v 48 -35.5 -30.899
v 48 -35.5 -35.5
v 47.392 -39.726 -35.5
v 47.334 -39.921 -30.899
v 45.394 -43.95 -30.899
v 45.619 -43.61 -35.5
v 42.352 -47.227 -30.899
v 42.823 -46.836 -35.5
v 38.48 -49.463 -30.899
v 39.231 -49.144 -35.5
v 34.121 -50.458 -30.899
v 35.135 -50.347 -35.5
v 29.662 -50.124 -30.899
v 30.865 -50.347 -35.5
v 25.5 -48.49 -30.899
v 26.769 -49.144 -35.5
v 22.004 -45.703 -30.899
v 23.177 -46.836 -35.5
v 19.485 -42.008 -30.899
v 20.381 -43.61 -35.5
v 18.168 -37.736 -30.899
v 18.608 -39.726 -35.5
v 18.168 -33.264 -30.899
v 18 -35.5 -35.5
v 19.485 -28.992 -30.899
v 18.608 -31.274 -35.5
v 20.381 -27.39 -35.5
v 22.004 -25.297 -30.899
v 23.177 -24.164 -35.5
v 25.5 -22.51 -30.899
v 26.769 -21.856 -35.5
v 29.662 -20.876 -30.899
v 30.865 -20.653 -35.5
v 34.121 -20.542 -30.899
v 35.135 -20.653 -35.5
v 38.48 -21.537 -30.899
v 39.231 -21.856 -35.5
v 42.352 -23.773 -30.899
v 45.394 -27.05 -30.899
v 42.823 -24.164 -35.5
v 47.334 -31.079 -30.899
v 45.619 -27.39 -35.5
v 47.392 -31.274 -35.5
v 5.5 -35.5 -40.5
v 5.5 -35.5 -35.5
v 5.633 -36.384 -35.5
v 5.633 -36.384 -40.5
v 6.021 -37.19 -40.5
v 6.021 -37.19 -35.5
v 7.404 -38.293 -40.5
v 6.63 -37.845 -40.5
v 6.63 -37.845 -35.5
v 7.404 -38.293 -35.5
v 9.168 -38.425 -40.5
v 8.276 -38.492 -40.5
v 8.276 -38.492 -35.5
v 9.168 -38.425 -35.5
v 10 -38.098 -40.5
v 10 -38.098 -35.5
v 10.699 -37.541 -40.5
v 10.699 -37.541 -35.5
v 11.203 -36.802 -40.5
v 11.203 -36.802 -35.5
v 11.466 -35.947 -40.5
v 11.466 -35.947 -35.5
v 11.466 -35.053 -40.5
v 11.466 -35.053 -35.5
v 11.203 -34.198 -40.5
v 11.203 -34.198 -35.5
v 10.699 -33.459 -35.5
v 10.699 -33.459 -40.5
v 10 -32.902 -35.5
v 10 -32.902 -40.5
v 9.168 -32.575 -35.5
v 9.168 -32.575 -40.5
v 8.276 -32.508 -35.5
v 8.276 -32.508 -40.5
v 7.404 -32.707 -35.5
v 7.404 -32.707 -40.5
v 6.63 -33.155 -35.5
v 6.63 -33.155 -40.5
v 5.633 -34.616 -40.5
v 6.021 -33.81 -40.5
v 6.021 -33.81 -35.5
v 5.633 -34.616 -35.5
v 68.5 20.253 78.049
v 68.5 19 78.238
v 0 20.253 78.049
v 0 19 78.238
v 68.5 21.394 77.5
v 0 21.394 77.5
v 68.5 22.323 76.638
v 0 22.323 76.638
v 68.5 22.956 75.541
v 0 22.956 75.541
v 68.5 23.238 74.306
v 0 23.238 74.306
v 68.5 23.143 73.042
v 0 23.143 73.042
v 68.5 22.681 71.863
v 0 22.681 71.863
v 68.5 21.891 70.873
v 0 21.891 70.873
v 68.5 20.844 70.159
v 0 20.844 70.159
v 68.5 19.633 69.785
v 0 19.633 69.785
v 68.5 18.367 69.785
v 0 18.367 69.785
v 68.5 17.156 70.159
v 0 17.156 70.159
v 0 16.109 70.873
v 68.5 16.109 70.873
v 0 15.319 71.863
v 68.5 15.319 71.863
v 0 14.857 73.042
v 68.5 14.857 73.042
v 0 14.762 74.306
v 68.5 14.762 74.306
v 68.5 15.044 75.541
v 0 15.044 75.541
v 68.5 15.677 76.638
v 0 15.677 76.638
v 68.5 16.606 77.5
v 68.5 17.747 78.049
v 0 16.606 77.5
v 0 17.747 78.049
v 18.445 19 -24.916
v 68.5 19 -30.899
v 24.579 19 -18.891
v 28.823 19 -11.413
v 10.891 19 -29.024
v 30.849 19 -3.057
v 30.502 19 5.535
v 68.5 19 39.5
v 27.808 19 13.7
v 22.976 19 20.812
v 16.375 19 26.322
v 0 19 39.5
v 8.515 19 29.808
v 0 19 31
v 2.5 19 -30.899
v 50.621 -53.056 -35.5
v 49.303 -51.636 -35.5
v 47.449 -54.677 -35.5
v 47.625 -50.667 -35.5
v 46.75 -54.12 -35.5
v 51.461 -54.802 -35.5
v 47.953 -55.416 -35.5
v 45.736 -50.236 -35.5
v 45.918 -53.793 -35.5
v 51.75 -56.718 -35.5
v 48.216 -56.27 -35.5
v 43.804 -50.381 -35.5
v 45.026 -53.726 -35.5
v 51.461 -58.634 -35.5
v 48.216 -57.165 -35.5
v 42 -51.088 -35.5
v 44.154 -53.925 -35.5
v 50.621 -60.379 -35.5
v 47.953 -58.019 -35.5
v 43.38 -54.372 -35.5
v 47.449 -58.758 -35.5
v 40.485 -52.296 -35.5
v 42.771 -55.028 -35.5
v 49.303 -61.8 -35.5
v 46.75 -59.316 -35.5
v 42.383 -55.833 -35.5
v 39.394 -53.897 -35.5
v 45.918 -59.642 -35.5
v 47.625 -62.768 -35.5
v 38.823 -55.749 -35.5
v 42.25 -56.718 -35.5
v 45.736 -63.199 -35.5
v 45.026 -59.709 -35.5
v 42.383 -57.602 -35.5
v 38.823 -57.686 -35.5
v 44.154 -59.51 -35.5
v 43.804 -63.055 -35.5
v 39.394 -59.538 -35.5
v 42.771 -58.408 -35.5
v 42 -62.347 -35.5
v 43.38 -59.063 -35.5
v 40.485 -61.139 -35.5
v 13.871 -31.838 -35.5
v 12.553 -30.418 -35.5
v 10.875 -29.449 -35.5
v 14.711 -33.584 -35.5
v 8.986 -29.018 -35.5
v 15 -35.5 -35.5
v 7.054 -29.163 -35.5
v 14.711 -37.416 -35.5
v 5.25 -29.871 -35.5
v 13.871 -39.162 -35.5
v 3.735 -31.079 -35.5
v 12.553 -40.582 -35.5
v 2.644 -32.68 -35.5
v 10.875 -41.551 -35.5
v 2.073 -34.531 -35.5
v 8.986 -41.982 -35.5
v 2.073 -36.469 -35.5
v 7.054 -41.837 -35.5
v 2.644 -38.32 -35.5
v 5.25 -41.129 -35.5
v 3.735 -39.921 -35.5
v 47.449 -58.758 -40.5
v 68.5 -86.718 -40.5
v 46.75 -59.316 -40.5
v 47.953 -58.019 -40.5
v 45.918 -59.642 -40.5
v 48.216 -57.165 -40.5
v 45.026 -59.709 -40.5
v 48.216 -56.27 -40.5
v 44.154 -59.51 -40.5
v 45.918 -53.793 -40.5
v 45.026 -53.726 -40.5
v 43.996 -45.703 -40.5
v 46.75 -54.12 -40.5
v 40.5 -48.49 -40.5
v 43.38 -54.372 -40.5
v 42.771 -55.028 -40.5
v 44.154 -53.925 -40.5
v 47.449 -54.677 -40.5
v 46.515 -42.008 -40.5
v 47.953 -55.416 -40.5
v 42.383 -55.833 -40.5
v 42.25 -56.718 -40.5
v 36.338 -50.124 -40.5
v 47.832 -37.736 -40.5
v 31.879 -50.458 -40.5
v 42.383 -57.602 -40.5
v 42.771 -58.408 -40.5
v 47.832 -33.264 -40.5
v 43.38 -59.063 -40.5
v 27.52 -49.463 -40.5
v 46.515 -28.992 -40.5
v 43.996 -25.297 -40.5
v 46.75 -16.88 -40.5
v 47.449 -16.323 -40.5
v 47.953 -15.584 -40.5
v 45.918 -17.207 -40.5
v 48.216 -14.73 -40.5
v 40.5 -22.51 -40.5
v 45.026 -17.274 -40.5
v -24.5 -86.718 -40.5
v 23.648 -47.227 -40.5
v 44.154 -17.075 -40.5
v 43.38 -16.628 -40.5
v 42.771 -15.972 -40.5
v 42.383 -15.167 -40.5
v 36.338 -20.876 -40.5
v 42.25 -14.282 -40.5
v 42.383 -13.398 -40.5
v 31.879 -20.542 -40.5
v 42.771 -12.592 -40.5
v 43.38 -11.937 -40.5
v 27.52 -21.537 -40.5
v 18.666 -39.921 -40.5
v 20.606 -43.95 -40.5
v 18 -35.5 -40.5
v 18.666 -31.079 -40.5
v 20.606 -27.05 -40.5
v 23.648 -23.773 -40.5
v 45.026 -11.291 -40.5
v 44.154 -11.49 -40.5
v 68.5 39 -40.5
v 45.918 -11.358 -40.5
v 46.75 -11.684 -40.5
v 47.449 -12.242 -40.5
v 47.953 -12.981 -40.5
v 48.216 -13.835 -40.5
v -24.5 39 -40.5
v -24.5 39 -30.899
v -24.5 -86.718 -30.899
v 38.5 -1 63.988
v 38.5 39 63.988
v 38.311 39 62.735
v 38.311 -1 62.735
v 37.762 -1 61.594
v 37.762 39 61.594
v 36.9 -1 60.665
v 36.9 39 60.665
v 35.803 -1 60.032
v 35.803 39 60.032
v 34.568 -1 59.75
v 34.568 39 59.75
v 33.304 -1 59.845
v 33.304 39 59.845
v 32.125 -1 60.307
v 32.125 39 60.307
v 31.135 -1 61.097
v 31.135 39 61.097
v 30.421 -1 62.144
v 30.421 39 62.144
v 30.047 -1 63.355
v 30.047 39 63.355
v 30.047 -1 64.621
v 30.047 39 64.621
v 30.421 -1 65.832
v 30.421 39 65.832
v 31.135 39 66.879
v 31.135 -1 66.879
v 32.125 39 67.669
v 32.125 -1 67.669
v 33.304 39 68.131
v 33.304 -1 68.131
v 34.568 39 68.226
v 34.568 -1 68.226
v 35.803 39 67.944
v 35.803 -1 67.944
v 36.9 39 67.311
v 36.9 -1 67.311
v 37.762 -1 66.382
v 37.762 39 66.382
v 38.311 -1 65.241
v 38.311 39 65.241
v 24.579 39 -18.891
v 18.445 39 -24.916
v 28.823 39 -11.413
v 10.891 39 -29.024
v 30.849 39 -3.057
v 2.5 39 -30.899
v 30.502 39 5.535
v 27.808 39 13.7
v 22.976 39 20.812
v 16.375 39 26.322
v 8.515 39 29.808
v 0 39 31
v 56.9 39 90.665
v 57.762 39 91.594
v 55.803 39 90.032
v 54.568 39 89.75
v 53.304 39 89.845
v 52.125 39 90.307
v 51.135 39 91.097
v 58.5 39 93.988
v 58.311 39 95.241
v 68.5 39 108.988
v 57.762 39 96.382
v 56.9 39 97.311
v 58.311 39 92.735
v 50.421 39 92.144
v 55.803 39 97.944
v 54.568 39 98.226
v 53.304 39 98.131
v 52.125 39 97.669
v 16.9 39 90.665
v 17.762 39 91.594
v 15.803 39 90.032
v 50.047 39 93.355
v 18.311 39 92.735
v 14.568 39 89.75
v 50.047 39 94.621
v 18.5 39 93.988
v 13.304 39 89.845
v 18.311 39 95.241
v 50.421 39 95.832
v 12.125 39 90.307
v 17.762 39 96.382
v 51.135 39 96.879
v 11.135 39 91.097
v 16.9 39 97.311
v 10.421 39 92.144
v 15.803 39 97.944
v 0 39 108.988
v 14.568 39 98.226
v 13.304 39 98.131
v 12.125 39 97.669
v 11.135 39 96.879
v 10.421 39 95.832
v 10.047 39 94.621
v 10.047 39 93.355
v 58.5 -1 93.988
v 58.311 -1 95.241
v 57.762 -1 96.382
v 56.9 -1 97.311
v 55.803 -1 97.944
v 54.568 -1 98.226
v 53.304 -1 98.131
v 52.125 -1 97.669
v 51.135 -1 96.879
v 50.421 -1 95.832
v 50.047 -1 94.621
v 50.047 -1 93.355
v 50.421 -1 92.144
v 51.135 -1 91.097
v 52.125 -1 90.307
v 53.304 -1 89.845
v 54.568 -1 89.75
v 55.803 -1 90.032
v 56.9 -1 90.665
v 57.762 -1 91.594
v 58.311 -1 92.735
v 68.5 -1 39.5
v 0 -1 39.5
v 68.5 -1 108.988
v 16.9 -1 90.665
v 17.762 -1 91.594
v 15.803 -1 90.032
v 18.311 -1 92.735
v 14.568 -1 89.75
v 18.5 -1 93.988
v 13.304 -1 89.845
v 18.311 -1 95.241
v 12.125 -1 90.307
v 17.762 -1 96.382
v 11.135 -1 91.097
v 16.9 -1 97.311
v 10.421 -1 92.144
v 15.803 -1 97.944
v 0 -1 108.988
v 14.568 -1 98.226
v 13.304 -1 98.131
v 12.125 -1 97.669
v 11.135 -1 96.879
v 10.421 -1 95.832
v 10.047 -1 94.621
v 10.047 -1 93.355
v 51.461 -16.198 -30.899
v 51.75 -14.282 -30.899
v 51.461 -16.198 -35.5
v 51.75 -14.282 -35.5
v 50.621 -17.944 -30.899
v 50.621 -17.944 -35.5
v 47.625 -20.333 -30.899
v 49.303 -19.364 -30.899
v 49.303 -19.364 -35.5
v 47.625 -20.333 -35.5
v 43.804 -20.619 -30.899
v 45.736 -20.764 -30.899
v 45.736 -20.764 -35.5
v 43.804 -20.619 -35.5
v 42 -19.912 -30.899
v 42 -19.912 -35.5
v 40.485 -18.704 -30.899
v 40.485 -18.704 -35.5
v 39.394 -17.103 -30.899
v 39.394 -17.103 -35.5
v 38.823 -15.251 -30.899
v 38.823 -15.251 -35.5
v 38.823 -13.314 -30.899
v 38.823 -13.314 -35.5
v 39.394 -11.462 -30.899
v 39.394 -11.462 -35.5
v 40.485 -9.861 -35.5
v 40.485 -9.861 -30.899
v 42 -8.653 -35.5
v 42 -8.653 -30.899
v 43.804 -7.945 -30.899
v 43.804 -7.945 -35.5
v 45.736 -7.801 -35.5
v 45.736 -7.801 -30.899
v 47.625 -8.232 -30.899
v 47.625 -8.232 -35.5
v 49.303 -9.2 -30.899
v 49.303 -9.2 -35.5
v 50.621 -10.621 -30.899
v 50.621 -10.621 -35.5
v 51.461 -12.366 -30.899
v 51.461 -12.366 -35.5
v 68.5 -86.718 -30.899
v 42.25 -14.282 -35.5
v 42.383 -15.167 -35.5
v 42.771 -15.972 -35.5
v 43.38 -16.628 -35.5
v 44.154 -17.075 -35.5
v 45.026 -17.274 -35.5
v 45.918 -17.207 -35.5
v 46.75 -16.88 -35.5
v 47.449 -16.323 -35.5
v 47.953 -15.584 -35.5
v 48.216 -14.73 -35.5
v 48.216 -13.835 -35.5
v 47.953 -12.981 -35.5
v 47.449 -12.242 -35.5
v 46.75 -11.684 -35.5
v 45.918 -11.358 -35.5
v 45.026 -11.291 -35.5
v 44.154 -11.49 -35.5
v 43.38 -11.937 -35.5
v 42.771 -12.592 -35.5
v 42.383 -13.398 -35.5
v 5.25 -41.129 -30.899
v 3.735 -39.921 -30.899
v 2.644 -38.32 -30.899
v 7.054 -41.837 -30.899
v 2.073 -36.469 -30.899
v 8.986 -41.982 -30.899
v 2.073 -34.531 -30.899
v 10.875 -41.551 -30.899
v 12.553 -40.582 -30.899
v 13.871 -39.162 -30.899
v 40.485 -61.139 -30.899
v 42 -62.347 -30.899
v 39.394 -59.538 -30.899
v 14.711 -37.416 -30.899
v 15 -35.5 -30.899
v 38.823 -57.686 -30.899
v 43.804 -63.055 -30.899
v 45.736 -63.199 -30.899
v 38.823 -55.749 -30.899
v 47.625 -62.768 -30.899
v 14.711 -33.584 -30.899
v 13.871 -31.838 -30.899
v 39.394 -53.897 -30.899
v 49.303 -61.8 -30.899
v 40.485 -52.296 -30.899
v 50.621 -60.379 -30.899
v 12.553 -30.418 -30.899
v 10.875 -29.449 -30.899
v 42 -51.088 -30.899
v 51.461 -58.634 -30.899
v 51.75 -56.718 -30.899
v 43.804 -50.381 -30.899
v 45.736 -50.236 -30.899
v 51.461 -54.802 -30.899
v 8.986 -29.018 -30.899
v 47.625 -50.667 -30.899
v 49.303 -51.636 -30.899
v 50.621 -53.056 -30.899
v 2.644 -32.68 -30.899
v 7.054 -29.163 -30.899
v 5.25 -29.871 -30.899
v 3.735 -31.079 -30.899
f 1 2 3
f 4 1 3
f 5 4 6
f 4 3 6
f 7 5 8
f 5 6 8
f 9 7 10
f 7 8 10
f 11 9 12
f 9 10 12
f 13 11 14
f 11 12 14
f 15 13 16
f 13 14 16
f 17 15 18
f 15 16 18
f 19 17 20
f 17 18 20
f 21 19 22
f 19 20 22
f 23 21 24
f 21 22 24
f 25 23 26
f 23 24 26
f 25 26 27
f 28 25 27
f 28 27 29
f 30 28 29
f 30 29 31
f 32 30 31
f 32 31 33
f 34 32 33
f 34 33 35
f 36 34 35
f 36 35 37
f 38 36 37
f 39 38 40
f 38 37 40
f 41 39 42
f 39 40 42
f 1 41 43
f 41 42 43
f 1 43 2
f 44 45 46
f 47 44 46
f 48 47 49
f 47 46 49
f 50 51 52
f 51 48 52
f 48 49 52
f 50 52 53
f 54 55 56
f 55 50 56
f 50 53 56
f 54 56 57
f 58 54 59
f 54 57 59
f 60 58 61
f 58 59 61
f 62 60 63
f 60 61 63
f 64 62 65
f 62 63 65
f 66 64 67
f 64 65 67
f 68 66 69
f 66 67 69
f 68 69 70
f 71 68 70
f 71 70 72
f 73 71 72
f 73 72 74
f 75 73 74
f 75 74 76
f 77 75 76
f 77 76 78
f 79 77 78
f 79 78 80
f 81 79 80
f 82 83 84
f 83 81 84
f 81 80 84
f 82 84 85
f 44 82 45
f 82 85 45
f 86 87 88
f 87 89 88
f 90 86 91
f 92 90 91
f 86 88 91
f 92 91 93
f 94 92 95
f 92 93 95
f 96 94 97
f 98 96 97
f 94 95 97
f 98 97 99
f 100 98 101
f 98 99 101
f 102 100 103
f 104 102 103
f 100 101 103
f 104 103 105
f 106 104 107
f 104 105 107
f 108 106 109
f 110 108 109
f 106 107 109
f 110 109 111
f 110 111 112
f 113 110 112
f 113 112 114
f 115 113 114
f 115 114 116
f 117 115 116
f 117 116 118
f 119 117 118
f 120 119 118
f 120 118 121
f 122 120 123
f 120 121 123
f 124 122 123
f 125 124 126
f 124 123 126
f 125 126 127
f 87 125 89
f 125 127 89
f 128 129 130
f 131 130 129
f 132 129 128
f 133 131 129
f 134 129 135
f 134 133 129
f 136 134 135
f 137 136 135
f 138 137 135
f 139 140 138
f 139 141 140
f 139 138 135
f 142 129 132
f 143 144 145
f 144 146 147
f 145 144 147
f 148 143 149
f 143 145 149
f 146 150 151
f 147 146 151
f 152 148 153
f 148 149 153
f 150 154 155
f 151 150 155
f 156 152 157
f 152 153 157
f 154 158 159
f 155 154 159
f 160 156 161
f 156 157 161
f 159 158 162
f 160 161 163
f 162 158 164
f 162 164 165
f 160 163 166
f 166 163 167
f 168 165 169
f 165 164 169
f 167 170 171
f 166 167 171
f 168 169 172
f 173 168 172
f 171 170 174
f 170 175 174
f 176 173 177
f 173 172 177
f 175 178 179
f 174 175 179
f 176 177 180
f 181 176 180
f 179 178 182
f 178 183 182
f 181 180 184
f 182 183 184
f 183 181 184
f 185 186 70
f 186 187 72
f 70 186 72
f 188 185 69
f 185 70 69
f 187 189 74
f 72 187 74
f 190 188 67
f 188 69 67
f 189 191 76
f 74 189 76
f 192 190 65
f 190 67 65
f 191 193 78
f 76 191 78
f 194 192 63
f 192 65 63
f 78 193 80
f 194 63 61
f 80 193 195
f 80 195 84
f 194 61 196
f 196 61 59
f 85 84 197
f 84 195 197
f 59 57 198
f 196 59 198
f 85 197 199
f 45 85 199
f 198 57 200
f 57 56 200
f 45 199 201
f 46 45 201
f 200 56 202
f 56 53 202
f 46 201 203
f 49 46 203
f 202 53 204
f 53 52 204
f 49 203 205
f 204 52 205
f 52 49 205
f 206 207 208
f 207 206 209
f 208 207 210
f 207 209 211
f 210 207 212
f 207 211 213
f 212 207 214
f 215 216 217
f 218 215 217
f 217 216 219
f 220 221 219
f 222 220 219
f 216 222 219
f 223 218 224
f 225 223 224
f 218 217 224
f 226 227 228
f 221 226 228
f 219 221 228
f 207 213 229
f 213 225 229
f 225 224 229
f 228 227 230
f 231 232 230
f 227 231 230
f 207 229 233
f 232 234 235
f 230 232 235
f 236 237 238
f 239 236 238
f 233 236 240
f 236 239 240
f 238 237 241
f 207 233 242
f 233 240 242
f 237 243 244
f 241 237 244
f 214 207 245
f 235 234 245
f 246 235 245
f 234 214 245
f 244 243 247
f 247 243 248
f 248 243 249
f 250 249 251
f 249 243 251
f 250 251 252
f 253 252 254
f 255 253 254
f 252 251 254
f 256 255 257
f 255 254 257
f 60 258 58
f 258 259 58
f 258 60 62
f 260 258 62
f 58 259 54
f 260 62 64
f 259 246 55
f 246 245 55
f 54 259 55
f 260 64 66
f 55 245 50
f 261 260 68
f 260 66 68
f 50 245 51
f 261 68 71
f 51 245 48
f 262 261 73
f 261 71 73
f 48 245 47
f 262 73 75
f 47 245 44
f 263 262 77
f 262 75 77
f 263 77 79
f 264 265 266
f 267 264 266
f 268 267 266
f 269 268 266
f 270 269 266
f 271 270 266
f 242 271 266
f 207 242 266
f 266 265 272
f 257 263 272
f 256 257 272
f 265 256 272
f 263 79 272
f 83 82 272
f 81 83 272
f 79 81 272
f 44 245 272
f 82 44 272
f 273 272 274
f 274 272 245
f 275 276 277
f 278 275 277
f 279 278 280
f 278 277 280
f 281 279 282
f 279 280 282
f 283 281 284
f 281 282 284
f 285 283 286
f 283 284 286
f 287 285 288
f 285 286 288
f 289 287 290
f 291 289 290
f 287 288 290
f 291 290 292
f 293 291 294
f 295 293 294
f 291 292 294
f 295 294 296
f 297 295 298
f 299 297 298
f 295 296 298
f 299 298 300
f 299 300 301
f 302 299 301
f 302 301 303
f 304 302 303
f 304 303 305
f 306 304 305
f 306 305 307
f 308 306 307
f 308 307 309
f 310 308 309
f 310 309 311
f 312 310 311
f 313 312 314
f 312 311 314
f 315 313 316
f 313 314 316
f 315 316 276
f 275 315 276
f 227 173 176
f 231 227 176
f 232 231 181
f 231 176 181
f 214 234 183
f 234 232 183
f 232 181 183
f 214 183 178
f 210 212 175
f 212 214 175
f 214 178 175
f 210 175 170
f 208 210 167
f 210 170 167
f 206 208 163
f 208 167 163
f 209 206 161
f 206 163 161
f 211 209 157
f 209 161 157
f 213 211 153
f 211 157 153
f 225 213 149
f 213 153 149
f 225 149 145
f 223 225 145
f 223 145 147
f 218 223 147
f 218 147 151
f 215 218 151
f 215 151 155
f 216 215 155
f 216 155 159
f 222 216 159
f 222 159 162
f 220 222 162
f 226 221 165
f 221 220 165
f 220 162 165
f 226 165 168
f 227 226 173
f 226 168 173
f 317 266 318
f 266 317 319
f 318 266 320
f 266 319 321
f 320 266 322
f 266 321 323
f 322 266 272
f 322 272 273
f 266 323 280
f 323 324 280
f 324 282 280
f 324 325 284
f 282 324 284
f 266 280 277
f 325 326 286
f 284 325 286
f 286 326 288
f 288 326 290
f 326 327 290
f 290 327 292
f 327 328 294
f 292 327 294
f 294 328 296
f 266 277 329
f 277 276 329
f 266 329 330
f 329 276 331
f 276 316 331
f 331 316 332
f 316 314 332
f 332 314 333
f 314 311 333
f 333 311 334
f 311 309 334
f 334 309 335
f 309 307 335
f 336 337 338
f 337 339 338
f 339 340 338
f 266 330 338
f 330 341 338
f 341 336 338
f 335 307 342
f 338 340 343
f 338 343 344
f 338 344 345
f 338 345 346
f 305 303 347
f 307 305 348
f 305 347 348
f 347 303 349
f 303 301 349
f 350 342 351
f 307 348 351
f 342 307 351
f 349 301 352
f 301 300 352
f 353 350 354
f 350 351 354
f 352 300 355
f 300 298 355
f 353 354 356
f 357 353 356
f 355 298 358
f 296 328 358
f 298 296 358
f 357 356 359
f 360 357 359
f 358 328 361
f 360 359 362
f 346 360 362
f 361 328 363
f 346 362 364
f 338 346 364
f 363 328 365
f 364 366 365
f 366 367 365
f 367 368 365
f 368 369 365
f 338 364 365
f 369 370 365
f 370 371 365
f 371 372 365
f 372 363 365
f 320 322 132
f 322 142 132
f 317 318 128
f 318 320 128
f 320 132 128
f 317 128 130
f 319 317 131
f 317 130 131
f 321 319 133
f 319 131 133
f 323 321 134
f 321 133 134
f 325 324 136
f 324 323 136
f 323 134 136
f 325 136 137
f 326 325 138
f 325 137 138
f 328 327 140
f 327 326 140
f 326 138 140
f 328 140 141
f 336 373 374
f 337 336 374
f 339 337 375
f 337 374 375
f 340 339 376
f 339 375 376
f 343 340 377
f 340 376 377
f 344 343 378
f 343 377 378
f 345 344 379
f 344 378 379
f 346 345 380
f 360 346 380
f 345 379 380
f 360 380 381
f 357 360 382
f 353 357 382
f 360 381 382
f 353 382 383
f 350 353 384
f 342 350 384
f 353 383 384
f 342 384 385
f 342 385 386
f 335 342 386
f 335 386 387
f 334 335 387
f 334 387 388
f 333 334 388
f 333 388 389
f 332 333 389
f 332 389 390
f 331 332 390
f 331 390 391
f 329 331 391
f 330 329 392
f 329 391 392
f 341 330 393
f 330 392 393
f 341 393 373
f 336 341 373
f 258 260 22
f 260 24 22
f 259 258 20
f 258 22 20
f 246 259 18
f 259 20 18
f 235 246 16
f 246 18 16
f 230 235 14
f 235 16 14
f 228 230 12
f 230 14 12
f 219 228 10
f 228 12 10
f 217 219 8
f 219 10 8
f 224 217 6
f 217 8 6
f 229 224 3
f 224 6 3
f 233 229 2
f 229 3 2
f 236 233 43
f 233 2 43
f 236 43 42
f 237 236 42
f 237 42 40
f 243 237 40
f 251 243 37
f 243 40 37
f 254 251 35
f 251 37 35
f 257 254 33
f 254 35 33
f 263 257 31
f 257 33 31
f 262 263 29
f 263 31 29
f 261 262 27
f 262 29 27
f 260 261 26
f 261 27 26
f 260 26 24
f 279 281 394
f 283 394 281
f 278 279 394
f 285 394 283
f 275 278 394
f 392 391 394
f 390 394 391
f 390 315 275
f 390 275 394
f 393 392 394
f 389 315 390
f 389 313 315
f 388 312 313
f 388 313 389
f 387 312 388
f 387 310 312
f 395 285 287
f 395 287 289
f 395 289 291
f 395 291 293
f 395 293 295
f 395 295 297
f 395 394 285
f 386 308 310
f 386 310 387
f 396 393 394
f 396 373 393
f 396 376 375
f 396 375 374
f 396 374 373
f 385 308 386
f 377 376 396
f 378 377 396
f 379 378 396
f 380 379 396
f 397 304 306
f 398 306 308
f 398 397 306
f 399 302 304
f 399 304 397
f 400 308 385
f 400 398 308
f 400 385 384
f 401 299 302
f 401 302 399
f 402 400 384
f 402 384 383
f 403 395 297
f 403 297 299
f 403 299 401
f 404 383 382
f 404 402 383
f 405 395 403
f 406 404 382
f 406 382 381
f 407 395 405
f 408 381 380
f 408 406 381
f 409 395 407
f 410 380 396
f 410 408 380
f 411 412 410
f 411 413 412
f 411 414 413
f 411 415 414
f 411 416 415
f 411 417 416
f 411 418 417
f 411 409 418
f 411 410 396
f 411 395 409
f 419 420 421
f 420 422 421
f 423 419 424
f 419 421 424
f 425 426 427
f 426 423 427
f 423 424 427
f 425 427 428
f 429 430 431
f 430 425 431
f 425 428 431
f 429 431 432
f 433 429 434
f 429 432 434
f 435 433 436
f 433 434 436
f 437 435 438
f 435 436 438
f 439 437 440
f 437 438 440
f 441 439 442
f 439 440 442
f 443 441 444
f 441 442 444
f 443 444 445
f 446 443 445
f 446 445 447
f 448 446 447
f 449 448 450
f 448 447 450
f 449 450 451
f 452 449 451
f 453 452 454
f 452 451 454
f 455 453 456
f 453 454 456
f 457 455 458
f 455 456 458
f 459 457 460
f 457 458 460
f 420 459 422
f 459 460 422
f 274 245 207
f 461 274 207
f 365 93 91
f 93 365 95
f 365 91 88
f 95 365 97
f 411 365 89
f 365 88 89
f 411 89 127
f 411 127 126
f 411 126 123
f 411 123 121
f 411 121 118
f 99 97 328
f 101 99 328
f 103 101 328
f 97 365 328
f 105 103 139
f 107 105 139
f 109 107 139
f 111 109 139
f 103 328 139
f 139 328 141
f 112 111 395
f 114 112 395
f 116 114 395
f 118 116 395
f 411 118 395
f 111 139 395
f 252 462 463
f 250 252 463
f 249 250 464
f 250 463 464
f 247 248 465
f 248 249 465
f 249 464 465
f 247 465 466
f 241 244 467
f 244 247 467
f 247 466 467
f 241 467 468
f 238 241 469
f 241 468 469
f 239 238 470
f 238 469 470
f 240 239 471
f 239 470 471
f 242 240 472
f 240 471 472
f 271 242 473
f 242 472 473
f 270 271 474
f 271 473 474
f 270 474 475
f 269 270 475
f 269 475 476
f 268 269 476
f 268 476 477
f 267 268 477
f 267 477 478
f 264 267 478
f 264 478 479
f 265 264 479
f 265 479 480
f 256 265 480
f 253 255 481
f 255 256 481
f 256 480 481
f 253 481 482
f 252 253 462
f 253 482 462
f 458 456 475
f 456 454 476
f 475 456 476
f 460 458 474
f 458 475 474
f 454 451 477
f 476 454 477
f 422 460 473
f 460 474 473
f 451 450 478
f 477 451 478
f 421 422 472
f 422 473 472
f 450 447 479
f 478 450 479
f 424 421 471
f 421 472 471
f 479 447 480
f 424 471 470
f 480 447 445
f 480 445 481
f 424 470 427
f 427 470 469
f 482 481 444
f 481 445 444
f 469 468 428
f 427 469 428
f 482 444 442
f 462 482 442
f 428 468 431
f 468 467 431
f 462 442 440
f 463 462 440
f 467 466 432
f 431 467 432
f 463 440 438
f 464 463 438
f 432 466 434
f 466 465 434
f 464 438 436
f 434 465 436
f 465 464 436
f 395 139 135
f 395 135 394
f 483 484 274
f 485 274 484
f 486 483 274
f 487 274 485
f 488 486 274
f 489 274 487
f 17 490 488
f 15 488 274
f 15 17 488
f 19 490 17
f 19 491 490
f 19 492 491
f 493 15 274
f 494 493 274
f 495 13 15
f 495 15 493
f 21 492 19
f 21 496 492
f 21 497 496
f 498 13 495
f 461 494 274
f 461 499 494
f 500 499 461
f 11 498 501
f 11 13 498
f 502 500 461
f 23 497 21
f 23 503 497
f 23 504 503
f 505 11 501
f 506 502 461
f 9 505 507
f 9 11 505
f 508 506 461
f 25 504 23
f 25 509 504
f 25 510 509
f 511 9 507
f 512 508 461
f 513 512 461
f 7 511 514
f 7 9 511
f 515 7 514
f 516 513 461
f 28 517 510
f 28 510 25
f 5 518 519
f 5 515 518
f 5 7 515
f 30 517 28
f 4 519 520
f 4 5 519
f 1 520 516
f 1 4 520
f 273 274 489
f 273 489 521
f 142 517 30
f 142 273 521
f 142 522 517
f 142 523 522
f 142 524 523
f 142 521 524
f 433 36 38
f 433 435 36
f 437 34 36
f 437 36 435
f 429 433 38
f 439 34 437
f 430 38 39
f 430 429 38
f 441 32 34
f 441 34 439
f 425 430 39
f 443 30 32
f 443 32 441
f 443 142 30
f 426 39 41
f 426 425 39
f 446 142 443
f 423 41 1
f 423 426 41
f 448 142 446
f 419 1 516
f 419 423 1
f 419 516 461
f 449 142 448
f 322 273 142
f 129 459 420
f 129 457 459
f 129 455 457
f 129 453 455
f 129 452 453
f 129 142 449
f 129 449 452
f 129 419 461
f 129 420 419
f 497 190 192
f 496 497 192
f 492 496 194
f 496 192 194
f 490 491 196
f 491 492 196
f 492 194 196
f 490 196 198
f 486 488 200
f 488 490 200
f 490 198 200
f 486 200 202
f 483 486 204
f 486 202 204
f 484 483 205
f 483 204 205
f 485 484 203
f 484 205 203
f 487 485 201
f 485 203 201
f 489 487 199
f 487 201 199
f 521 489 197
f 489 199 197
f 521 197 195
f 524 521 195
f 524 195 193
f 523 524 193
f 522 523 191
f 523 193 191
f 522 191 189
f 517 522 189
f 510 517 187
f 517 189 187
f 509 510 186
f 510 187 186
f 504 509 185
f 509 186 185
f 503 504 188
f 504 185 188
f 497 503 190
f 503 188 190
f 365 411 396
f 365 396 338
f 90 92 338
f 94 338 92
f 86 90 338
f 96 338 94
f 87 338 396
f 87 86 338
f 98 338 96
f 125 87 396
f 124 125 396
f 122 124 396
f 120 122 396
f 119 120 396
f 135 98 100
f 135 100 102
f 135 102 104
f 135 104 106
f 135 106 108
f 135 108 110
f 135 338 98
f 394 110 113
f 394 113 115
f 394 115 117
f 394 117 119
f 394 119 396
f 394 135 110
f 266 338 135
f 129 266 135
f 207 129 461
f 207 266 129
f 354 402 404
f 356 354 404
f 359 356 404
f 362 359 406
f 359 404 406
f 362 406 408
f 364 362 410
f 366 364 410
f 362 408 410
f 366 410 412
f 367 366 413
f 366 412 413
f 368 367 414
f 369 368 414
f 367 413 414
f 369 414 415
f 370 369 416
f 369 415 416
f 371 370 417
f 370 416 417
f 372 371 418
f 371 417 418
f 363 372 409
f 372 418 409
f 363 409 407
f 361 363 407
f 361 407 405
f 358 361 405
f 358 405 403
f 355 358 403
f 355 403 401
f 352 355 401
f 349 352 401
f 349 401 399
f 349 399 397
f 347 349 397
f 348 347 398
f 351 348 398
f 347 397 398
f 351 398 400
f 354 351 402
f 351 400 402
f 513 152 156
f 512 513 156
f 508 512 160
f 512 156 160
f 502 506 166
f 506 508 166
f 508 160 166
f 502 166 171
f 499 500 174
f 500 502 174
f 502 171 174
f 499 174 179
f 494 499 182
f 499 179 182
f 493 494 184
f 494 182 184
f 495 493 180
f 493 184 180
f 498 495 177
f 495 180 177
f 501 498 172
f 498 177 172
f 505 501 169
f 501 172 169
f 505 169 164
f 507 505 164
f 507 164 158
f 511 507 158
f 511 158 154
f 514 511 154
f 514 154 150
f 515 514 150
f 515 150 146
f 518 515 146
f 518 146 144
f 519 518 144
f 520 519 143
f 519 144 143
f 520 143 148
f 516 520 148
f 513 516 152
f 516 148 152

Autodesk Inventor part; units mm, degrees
ref_plane "YZ Plane" through (0, 0, 0) normal (1, 0, 0) x (0, 1, 0)
ref_plane "XZ Plane" through (0, 0, 0) normal (0, 1, 0) x (-1, 0, 0)
ref_plane "Work Plane1" through (8.5, -35.5, -35.5) normal (0, 0, -1) x (-1, 0, 0)
sketch "Sketch1" plane through (8.5, -35.5, -35.5) normal (0, 0, -1) x (-1, 0, 0)
  circle A0 centre (0, 0) radius 3 projected
  circle A1 centre (0, 0) radius 6 projected
  circle A2 centre (-36.75, -21.2176) radius 3 projected
  circle A3 centre (-36.75, -21.2176) radius 6 projected
  circle A4 centre (-36.75, 21.2176) radius 6 projected
  circle A5 centre (-36.75, 21.2176) radius 3 projected
  line L0 (-36.75, -46.2176) -> (28, -46.2176)
  line L1 (28, -46.2176) -> (28, 0)
  line L2 (-36.75, -46.2176) -> (-59, -46.2176)
  line L3 (-59, -46.2176) -> (-59, 34.5)
  line L4 (-59, 34.5) -> (28, 34.5)
  line L5 (34.5, 35.5) -> (-17.5, 35.5) projected
  line L6 (28, 34.5) -> (28, 0)
  circle A6 centre (-24.5, 0) radius 11 projected
  circle A7 centre (-24.5, 0) radius 15
  point P0 (8.5, 35.5)
  dimension "d3" = 30
extrude "Extrusion1" add sketch "Sketch1" along normal blind 5 contours A1 | A3 | A4 | L2 L3 L4 L6 L1 L0
sketch "Sketch2" plane through (-19.5, -81.7176, -35.5) normal (-1, 0, 0) x (0, 0, 1)
  line L0 (0, 0) -> (0, 80.7176) projected
  line L1 (0, 80.7176) -> (-5, 80.7176) projected
  line L2 (-5, 0) -> (-5, 80.7176) projected
  line L3 (0, 0) -> (-5, 0) projected
  point P0 (35.5, 81.7176)
extrude "Extrusion2" add sketch "Sketch2" along normal blind 5
sketch "Sketch3" plane through (67.5, -81.7176, -40.5) normal (0, -1, 0) x (1, 0, 0)
  line L0 (0, 5) -> (-92, 5) projected
  line L1 (-92, 0) -> (-92, 5) projected
  line L2 (0, 0) -> (-92, 0) projected
  line L3 (0, 5) -> (0, 0) projected
  point P0 (-67.5, 40.5)
extrude "Extrusion3" add sketch "Sketch3" along normal blind 5
sketch "Sketch4" plane through (8.5, -35.5, -35.5) normal (0, 0, 1) x (1, 0, 0)
  line L0 (-28, -46.2176) -> (-28, 34.5)
  line L1 (-28, -46.2176) -> (59, -46.2176)
  line L2 (59, -51.2176) -> (-33, -51.2176) projected
  line L3 (-33, 34.5) -> (-33, -51.2176) projected
  line L4 (59, 34.5) -> (59, -51.2176) projected
  line L5 (59, 34.5) -> (-33, 34.5) projected
  line L6 (-28, -46.2176) -> (-33, -46.2176)
  line L7 (-33, 34.5) -> (-33, -51.2176) projected
extrude "Extrusion4" add sketch "Sketch4" along normal blind 75 contours L1 L4 L2 L3 L6
sketch "Sketch5" plane through (67.5, -86.7176, -40.5) normal (0, -1, 0) x (1, 0, 0)
  line L0 (-92, 5) -> (-92, 80) projected
  line L1 (-92, 80) -> (-77.75, 80)
  line L2 (-92, 80) -> (0, 80) projected
  line L3 (-77.75, 80) -> (-37.75, 80)
  line L4 (-37.75, 80) -> (-37.75, 65)
  line L5 (-37.75, 65) -> (-77.75, 65)
  circle A0 centre (-77.75, 65) radius 4.25
  circle A1 centre (-37.75, 65) radius 4.25
  point P0 (-67.5, 40.5)
  dimension "d14" = 14.25
  dimension "d15" = 40
  dimension "d16" = 15
  dimension "d17" = 8.5
  dimension "d18" = 8.5
extrude "Extrusion5" cut sketch "Sketch5" against normal through all
sketch "Sketch6" plane through (67.5, -1, -35.5) normal (0, 1, 0) x (1, 0, 0)
  line L0 (0, 0) -> (-92, 0) projected
  line L1 (0, 0) -> (0, 5) projected
  line L2 (0, 5) -> (-92, 5) projected
  line L3 (-92, 0) -> (-92, 5) projected
  point P0 (-67.5, -35.5)
extrude "Extrusion6" add sketch "Sketch6" along normal blind 20
sketch "Sketch7" plane through (67.5, 19, -35.5) normal (0, 1, 0) x (1, 0, 0)
  circle A0 centre (-67.5, -35.5) radius 31 projected
  circle A1 centre (-67.5, -35.5) radius 31 projected
  circle A2 centre (-67.5, -35.5) radius 31 projected
  line L0 (-67.5, -66.5) -> (-67.5, -75)
  line L1 (0, -75) -> (-92, -75) projected
  line L2 (0, 5) -> (0, -75) projected
  line L3 (-67.5, -75) -> (0, -75)
  line L4 (0, -75) -> (0, 5)
  line L5 (-65, -20.5) -> (-65, 0) projected
  line L6 (-65, -4.601) -> (-65, 0)
  line L7 (-92, 5) -> (-92, 0) projected
  line L8 (-92, 0) -> (0, 0) projected
  line L9 (0, 0) -> (0, 5) projected
  line L10 (0, 5) -> (-92, 5) projected
  point P0 (-65, -4.601)
extrude "Extrusion7" add sketch "Sketch7" along normal blind 20 contours A0 L5 L8 L2 L1 L0 | L8 L7 L10 L2
sketch "Sketch10" plane through (8.5, -35.5, 39.5) normal (0, 0, 1) x (1, 0, 0)
  line L0 (59, -51.2176) -> (59, -46.2176) projected
  line L1 (59, -46.2176) -> (-33, -46.2176) projected
  line L2 (-33, -46.2176) -> (-33, -51.2176) projected
  line L3 (-33, -51.2176) -> (59, -51.2176) projected
  point P0 (-8.5, 35.5)
extrude "Extrusion10" cut sketch "Sketch10" against normal up to surface (75 mm away)
sketch "Sketch11" plane through (0, 19, 39.5) normal (0, 0, 1) x (1, 0, 0)
  line L0 (0, 0) -> (67.5, 0) projected
  line L1 (67.5, 0) -> (67.5, 20) projected
  line L2 (0, 20) -> (67.5, 20) projected
  line L3 (0, 0) -> (0, 20) projected
  point P0 (0, -19)
extrude "Extrusion11" add sketch "Sketch11" along normal blind 10
sketch "Sketch12" plane through (67.5, 19, -35.5) normal (0, -1, 0) x (1, 0, 0)
  line L0 (-67.5, 66.5) -> (-67.5, 85) projected
  line L1 (-67.5, 85) -> (0, 85) projected
  line L2 (-67.5, 85) -> (0, 85)
  line L3 (0, 85) -> (0, 75)
  line L4 (0, 0) -> (0, 85) projected
  line L5 (0, 75) -> (-67.5, 75)
  line L6 (-67.5, 75) -> (-67.5, 85)
  point P0 (-67.5, 35.5)
  dimension "d35" = 10
extrude "Extrusion12" add sketch "Sketch12" along normal blind 20
sketch "Sketch13" plane through (0, 19, 49.5) normal (0, 0, 1) x (1, 0, 0)
  line L0 (67.5, 20) -> (67.5, -20) projected
  line L1 (67.5, 20) -> (0, 20) projected
  line L2 (0, 20) -> (0, -20) projected
  line L3 (67.5, -20) -> (0, -20) projected
  point P0 (0, -19)
extrude "Extrusion13" add sketch "Sketch13" along normal blind 59.488
sketch "Sketch14" plane through (67.5, -1, -35.5) normal (0, -1, 0) x (1, 0, 0)
  line L0 (-53.25, 129.488) -> (-13.25, 129.488)
  circle A0 centre (-53.25, 129.488) radius 4.25
  circle A1 centre (-13.25, 129.488) radius 4.25
  point P0 (-67.5, 35.5)
  point P1 (-67.5, 144.488)
  dimension "d43" = 40
  dimension "d44" = 8.5
  dimension "d45" = 8.5
extrude "Extrusion14" cut sketch "Sketch14" against normal up to surface (40 mm away)
sketch "Sketch15" plane through (67.5, -86.7176, -40.5) normal (1, 0, 0) x (0, 0, -1)
  line L0 (-5, 105.7176) -> (-5, 0) projected
  line L1 (0, 0) -> (-5, 0) projected
  line L2 (0, 0) -> (0, 125.7176) projected
  line L3 (0, 125.7176) -> (-149.488, 125.7176) projected
  line L4 (-149.488, 85.7176) -> (-149.488, 125.7176) projected
  line L5 (-80, 85.7176) -> (-149.488, 85.7176) projected
  line L6 (-80, 105.7176) -> (-80, 85.7176) projected
  line L7 (-5, 105.7176) -> (-80, 105.7176) projected
  point P0 (-40.5, 86.7176)
extrude "Extrusion15" add sketch "Sketch15" along normal blind 1
sketch "Sketch16" plane through (0, 19, 31) normal (-1, 0, 0) x (0, 0, 1)
  line L0 (77.988, 20) -> (77.988, -20) projected
  line L1 (77.988, 0) -> (42.988, 0)
  circle A0 centre (42.988, 0) radius 4.25
  point P0 (-31, -19)
  dimension "d50" = 35
  dimension "d51" = 8.5
extrude "Extrusion16" cut sketch "Sketch16" against normal up to surface (68.5 mm away)
sketch "Sketch17" plane through (67.5, 39, -35.5) normal (0, 1, 0) x (1, 0, 0)
  circle A0 centre (-53.25, -129.488) radius 4.25 projected
  line L0 (-53.25, -129.488) -> (-33.25, -129.488)
  line L1 (-33.25, -129.488) -> (-33.25, -99.488)
  circle A1 centre (-33.25, -99.488) radius 4.25
  point P0 (-67.5, -35.5)
  dimension "d54" = 20
  dimension "d55" = 30
  dimension "d56" = 8.5
extrude "Extrusion17" cut sketch "Sketch17" against normal up to surface (40 mm away) contours A1
sketch "Sketch18" plane through (8.5, -35.5, -35.5) normal (0, 0, 1) x (1, 0, 0)
  line L0 (-6, 54.5) -> (60, 54.5) projected
  line L1 (-6, 54.5) -> (-6, 74.5) projected
  line L2 (-33, 74.5) -> (-6, 74.5) projected
  line L3 (-33, 74.5) -> (-33, -51.2176) projected
  line L4 (-33, -51.2176) -> (60, -51.2176) projected
  line L5 (60, 54.5) -> (60, -51.2176) projected
  circle A0 centre (0, 0) radius 3 projected
  circle A1 centre (36.75, -21.2176) radius 3 projected
  circle A2 centre (36.75, 21.2176) radius 3 projected
  circle A3 centre (24.5, 0) radius 15 projected
  circle A4 centre (36.75, 21.2176) radius 6.5
  circle A5 centre (36.75, -21.2176) radius 6.5
  circle A6 centre (0, 0) radius 3 projected
  circle A7 centre (0, 0) radius 6.5
  point P0 (-8.5, 35.5)
  dimension "d59" = 13
  dimension "d60" = 13
  dimension "d61" = 13
extrude "Extrusion18" add sketch "Sketch18" along normal up to surface (4.601 mm away) contours L0 L5 L4 L3 L2 L1
properties part number "motor_connector_left"
